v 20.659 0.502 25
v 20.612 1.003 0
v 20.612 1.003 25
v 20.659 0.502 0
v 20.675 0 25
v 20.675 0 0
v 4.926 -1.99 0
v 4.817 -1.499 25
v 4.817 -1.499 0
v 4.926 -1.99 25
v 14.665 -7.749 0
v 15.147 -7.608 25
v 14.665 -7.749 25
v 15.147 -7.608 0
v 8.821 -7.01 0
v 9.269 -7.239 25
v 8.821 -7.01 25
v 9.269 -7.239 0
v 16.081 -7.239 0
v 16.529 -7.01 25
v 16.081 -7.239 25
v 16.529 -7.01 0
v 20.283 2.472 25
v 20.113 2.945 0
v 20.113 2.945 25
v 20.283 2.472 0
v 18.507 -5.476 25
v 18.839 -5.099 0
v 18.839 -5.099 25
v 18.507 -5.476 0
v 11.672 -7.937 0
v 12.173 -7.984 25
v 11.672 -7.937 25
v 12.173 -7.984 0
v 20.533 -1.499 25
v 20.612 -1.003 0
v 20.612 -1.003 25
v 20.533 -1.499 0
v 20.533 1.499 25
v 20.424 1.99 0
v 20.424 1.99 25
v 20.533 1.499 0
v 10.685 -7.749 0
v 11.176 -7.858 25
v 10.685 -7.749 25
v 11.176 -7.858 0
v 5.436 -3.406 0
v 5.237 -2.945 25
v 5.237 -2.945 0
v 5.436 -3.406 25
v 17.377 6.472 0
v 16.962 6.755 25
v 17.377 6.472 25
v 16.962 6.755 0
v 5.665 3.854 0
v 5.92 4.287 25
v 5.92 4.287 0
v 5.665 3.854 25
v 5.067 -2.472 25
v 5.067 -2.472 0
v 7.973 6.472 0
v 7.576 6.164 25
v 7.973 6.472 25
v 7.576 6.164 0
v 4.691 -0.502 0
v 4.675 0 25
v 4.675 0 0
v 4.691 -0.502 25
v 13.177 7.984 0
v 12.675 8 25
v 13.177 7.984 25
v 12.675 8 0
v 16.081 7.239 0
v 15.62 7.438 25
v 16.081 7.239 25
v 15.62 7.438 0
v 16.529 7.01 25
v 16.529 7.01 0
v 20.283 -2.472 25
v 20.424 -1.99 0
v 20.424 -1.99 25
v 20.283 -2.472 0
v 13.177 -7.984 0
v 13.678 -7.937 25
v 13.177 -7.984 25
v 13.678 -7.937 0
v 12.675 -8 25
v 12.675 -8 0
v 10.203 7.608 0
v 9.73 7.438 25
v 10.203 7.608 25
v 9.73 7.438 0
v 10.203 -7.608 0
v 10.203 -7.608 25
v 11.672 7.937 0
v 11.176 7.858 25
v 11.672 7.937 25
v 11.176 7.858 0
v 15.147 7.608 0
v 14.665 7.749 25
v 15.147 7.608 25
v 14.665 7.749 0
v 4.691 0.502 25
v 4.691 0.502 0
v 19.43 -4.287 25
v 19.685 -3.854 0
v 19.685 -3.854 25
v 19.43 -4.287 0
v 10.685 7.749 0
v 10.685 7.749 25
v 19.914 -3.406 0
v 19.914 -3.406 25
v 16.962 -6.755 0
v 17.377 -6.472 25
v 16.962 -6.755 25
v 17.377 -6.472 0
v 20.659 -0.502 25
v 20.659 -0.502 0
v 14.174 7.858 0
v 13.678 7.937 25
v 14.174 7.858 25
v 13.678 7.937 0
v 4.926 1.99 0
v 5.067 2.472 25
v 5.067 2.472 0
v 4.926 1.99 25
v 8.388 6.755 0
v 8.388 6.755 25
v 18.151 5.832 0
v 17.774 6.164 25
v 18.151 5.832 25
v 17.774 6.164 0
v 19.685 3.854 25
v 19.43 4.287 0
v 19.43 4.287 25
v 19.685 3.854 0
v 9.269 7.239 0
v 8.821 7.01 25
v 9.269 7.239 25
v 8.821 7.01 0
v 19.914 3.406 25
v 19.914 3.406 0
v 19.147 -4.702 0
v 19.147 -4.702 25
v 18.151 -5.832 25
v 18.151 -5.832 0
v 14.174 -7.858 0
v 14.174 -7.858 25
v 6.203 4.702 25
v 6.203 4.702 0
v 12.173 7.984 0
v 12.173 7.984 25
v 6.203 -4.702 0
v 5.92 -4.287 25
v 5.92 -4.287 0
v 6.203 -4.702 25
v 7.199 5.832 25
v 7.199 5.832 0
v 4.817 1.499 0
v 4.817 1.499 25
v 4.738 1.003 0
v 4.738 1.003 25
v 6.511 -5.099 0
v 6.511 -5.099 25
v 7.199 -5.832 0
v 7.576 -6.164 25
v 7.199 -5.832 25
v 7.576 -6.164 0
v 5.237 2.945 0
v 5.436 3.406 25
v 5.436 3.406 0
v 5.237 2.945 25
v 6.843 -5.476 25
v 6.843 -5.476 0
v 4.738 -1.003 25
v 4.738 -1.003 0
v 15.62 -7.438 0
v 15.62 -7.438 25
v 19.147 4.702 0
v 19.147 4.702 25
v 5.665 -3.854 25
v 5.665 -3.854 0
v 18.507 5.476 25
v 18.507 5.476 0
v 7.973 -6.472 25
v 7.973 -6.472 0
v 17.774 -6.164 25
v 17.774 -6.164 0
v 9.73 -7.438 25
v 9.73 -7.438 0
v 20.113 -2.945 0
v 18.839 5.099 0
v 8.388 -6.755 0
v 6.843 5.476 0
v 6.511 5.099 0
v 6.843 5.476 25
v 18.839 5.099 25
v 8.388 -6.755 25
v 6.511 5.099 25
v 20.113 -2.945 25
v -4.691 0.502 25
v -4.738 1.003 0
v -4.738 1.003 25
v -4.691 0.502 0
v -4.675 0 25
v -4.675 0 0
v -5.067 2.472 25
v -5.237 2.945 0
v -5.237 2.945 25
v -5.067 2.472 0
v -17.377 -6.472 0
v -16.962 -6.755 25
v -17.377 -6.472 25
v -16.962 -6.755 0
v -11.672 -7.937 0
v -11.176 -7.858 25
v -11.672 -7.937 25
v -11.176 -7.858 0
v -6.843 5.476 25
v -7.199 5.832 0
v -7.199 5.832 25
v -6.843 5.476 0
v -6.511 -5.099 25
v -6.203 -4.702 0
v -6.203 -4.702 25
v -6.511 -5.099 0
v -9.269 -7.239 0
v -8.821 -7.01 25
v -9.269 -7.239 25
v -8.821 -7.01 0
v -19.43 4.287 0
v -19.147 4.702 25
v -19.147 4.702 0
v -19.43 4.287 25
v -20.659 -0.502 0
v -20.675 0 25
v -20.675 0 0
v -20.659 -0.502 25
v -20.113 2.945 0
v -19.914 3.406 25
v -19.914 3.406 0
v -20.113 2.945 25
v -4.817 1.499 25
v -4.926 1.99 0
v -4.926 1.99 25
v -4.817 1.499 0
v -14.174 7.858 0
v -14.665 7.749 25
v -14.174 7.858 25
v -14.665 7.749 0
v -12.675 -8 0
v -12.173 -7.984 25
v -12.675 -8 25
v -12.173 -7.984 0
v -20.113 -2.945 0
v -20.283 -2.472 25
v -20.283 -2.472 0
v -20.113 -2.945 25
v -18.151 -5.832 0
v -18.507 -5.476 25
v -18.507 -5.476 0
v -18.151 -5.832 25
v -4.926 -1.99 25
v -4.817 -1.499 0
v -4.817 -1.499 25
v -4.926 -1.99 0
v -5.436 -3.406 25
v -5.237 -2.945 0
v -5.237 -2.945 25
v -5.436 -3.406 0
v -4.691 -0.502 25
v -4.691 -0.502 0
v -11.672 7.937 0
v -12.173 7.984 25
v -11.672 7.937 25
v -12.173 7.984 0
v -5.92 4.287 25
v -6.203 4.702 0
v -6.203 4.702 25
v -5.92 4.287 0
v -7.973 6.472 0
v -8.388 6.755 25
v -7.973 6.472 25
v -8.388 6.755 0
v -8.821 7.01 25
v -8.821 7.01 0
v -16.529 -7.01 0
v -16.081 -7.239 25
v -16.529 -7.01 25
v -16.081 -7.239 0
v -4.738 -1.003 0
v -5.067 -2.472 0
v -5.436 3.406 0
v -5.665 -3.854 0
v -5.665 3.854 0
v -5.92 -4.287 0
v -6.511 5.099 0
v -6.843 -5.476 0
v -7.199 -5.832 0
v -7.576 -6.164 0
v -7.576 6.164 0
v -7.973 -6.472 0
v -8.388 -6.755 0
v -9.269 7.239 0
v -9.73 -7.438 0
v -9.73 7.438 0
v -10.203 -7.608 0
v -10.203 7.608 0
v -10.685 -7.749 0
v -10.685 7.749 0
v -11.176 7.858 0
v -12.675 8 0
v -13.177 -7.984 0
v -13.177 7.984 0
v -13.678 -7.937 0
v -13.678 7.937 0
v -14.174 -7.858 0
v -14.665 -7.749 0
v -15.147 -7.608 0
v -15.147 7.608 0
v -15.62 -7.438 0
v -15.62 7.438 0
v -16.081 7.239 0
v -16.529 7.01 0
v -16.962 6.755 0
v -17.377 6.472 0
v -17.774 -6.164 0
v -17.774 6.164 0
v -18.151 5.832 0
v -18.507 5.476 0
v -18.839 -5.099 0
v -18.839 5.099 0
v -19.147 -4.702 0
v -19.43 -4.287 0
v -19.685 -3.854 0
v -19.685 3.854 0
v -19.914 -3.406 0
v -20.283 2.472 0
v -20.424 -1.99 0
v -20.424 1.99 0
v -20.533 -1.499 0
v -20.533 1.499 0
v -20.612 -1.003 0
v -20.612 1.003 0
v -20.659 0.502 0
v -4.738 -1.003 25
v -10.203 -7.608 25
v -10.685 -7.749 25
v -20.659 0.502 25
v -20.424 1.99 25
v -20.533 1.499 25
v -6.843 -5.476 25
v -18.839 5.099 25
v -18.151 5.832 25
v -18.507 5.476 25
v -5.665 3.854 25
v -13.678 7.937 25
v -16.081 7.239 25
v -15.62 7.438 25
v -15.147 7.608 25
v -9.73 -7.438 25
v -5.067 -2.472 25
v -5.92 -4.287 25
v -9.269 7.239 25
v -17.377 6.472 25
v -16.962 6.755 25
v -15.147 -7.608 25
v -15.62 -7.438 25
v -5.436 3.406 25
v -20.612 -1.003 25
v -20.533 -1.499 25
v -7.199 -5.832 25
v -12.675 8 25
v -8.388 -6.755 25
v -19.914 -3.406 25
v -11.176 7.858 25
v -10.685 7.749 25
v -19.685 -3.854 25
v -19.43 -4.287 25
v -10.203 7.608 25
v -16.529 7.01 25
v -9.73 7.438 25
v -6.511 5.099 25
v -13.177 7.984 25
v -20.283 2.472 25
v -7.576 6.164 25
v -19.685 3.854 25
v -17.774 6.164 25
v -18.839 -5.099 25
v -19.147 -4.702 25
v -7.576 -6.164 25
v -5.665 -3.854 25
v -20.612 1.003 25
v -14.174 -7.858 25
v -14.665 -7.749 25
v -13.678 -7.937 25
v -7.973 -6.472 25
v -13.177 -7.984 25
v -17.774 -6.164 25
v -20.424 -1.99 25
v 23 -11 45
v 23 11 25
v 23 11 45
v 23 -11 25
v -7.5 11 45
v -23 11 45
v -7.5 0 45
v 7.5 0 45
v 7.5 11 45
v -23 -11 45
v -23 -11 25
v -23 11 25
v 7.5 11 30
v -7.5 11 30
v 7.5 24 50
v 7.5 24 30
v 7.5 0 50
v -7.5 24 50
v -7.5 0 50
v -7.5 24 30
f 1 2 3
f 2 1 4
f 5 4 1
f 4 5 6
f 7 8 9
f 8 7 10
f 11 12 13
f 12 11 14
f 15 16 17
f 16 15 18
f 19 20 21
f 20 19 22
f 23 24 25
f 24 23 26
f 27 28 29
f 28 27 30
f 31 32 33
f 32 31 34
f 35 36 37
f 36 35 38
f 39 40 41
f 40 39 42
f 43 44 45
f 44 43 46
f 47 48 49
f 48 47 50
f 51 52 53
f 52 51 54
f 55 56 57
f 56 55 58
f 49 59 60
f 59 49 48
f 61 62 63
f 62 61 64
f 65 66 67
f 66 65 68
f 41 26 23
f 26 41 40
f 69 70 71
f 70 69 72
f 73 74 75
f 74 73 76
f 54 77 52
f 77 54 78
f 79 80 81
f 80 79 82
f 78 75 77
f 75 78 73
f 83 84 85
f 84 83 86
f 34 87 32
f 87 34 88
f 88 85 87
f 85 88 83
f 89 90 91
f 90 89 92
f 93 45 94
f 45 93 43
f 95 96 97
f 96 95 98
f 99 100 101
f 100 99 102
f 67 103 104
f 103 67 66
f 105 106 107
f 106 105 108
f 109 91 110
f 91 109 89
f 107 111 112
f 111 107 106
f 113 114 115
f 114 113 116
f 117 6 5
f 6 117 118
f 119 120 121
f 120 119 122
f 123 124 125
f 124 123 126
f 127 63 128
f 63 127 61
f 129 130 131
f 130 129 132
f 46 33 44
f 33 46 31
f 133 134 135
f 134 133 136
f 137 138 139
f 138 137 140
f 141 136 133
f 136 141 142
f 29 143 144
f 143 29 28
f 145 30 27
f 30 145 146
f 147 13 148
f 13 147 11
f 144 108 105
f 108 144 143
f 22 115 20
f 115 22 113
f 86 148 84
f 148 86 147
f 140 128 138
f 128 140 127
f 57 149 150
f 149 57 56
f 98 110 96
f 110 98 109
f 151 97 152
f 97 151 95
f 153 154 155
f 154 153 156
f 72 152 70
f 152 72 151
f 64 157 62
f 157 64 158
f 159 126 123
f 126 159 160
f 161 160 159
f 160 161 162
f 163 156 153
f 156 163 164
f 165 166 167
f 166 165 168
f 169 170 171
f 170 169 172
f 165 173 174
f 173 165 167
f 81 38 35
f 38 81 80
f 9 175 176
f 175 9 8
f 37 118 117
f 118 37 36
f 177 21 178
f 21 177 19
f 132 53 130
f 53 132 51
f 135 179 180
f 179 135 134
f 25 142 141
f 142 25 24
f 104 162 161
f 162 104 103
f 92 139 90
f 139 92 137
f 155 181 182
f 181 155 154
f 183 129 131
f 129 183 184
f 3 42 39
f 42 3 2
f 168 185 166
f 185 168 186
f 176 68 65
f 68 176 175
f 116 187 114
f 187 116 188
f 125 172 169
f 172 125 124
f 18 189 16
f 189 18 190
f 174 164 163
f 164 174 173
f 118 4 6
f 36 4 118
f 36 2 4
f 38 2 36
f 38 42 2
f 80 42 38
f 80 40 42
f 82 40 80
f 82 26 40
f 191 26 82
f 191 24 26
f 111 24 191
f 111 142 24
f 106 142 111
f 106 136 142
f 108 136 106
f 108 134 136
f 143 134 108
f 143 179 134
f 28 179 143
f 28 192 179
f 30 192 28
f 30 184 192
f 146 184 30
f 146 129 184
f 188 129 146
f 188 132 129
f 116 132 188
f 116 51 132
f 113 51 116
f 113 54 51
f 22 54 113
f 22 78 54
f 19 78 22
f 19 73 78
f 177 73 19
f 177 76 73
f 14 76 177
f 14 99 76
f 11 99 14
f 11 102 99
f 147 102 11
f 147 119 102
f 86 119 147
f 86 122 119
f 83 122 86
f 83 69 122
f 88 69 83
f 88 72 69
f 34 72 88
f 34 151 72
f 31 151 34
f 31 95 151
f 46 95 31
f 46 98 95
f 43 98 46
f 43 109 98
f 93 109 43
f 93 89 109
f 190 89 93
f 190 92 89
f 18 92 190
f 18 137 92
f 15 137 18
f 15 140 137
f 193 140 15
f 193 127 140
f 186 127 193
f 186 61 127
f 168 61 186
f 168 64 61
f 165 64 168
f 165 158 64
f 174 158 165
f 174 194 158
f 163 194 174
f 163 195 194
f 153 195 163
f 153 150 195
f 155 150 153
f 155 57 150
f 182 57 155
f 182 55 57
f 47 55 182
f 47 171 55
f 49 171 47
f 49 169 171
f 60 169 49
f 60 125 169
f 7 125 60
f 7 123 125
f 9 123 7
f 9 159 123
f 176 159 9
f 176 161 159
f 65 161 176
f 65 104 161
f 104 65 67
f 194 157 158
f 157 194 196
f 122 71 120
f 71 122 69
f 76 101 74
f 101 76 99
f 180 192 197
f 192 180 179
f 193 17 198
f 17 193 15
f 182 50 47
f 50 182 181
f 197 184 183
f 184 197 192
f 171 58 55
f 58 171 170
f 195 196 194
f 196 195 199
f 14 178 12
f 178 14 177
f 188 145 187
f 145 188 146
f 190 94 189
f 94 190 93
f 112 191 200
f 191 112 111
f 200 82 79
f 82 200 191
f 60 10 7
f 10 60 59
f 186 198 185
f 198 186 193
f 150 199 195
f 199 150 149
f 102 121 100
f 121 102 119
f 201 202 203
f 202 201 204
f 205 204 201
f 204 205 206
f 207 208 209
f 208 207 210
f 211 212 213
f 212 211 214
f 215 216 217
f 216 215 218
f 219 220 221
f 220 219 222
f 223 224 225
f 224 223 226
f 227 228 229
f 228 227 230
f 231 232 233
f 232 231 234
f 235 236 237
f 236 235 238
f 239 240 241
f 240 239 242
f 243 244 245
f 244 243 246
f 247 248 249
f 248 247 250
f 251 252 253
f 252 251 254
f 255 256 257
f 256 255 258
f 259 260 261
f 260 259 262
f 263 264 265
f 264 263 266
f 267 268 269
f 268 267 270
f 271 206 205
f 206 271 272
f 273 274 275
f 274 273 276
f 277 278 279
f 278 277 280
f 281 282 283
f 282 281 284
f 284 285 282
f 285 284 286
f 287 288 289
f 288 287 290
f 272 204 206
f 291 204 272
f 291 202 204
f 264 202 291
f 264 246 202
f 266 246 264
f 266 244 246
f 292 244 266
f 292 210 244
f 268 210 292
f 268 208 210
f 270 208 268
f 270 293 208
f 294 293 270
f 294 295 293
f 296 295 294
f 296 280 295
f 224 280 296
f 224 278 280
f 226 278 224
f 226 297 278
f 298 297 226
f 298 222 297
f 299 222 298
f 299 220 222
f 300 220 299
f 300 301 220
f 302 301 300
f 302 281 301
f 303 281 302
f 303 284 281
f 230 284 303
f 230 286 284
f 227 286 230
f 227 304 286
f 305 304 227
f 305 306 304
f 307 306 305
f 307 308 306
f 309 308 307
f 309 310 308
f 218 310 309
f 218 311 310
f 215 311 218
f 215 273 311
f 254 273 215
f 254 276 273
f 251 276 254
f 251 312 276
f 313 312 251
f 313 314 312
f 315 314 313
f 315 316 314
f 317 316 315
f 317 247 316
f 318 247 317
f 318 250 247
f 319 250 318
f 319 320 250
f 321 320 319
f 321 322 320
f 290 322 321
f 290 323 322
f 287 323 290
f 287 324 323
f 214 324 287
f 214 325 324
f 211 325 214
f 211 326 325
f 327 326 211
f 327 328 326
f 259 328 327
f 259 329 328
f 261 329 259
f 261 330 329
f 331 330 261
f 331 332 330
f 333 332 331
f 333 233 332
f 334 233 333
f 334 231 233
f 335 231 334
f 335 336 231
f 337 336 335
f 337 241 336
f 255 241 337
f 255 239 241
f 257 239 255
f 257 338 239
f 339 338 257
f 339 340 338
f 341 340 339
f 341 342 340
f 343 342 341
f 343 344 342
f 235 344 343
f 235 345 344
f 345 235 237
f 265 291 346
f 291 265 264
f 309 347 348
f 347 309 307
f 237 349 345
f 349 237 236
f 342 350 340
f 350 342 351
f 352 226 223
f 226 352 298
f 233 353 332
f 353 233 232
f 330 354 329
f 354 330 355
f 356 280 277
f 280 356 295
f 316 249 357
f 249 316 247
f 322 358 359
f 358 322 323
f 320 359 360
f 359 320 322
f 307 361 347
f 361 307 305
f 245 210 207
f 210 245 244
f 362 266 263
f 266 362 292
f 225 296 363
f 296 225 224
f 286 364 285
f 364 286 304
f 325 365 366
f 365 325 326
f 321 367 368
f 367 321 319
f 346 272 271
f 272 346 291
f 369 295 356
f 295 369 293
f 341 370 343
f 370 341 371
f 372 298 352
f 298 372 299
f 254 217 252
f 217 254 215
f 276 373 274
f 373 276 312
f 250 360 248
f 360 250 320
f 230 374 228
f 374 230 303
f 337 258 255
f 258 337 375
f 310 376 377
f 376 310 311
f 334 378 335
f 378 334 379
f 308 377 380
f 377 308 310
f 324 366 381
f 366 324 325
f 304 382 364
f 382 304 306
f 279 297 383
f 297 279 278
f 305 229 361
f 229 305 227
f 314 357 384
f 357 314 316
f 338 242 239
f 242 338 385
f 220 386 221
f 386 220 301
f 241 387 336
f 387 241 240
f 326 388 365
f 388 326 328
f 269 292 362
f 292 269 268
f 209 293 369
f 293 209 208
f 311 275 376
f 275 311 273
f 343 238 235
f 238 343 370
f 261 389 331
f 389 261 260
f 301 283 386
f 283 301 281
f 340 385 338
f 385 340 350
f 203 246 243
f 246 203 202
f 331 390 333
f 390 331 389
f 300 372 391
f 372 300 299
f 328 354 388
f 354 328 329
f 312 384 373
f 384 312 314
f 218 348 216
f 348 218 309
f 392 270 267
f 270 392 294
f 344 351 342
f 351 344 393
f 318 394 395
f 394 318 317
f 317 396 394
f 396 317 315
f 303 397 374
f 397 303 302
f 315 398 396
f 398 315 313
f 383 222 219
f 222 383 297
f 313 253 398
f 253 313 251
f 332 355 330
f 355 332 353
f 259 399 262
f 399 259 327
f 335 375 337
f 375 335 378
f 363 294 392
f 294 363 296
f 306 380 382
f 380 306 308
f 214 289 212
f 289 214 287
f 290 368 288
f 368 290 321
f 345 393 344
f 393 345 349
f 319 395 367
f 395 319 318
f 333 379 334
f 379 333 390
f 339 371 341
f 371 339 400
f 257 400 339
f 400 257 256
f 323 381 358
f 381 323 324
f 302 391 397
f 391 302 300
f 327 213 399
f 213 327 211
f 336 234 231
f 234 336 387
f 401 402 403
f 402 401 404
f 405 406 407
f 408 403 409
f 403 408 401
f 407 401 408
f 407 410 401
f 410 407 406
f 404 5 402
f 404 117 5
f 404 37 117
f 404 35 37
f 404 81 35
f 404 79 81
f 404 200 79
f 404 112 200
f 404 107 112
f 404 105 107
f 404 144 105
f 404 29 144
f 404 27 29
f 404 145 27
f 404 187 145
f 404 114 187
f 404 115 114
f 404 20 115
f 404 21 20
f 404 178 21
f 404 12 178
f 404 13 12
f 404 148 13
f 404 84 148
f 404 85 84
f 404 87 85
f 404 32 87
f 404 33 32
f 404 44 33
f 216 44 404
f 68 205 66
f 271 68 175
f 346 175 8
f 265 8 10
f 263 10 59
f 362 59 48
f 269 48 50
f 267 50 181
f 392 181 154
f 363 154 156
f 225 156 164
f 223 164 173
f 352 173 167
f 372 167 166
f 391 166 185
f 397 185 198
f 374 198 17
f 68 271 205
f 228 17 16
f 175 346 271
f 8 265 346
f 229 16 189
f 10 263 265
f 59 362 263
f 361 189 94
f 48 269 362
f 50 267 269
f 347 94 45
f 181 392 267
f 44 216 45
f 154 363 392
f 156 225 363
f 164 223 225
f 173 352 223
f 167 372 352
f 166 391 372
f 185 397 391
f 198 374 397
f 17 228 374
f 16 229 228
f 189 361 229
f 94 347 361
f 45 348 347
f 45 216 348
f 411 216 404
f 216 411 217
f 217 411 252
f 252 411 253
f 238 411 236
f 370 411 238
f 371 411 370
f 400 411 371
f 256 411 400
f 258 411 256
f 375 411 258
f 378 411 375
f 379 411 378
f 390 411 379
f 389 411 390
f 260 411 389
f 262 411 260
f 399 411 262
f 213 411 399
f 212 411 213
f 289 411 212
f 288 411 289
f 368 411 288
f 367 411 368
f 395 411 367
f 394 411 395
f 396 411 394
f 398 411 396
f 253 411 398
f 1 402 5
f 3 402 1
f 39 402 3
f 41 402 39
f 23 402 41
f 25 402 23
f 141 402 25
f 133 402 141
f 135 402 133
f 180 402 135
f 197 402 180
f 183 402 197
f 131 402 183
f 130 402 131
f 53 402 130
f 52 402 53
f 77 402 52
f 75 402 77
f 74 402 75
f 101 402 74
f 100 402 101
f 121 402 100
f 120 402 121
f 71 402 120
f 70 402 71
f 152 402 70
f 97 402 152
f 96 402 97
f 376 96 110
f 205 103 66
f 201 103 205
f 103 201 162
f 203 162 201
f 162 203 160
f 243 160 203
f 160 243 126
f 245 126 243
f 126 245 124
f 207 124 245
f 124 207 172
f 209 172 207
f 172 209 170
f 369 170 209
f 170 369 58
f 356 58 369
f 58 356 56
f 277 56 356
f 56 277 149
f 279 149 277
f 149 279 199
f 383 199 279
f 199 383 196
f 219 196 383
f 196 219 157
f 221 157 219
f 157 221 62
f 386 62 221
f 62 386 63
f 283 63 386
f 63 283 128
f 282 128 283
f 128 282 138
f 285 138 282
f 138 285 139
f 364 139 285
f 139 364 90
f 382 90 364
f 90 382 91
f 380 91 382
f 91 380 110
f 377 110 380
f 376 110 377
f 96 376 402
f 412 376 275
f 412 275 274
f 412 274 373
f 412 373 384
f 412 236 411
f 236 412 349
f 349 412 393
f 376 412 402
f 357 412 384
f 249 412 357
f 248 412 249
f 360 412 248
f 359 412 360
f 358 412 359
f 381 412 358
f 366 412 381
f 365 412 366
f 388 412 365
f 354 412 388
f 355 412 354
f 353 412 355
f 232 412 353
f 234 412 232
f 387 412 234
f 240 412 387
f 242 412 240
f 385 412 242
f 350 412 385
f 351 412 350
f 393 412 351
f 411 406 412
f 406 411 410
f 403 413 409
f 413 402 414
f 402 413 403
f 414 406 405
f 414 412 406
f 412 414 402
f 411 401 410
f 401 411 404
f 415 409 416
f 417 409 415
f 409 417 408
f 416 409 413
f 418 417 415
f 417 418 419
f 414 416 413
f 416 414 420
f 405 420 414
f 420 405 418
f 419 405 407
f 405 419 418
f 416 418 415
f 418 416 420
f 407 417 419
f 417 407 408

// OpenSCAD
$fn=100;
radius_fudge_factor=0; //.4*2;

sensor_r=16/2+radius_fudge_factor;
cap_r=2*25/2;

heights=1*25;

sensor_gap=9.35+2*sensor_r-2*radius_fudge_factor;

sensor_board=[46,22,20];
sensor_board_offset=[-46/2,-22/2,heights];
sensor_plug=[15,24,20];
sensor_plug_offset=[-15/2,0,heights+5];
    
    
    union(){
                    translate([sensor_gap/2,0,0])
                        cylinder(r=sensor_r, h=heights+2);
                    translate([-sensor_gap/2,0,0])
                        cylinder(r=sensor_r, h=heights+2);
                    translate(sensor_board_offset)
                        cube(sensor_board);
                    translate(sensor_plug_offset)
                        cube(sensor_plug);
    }
